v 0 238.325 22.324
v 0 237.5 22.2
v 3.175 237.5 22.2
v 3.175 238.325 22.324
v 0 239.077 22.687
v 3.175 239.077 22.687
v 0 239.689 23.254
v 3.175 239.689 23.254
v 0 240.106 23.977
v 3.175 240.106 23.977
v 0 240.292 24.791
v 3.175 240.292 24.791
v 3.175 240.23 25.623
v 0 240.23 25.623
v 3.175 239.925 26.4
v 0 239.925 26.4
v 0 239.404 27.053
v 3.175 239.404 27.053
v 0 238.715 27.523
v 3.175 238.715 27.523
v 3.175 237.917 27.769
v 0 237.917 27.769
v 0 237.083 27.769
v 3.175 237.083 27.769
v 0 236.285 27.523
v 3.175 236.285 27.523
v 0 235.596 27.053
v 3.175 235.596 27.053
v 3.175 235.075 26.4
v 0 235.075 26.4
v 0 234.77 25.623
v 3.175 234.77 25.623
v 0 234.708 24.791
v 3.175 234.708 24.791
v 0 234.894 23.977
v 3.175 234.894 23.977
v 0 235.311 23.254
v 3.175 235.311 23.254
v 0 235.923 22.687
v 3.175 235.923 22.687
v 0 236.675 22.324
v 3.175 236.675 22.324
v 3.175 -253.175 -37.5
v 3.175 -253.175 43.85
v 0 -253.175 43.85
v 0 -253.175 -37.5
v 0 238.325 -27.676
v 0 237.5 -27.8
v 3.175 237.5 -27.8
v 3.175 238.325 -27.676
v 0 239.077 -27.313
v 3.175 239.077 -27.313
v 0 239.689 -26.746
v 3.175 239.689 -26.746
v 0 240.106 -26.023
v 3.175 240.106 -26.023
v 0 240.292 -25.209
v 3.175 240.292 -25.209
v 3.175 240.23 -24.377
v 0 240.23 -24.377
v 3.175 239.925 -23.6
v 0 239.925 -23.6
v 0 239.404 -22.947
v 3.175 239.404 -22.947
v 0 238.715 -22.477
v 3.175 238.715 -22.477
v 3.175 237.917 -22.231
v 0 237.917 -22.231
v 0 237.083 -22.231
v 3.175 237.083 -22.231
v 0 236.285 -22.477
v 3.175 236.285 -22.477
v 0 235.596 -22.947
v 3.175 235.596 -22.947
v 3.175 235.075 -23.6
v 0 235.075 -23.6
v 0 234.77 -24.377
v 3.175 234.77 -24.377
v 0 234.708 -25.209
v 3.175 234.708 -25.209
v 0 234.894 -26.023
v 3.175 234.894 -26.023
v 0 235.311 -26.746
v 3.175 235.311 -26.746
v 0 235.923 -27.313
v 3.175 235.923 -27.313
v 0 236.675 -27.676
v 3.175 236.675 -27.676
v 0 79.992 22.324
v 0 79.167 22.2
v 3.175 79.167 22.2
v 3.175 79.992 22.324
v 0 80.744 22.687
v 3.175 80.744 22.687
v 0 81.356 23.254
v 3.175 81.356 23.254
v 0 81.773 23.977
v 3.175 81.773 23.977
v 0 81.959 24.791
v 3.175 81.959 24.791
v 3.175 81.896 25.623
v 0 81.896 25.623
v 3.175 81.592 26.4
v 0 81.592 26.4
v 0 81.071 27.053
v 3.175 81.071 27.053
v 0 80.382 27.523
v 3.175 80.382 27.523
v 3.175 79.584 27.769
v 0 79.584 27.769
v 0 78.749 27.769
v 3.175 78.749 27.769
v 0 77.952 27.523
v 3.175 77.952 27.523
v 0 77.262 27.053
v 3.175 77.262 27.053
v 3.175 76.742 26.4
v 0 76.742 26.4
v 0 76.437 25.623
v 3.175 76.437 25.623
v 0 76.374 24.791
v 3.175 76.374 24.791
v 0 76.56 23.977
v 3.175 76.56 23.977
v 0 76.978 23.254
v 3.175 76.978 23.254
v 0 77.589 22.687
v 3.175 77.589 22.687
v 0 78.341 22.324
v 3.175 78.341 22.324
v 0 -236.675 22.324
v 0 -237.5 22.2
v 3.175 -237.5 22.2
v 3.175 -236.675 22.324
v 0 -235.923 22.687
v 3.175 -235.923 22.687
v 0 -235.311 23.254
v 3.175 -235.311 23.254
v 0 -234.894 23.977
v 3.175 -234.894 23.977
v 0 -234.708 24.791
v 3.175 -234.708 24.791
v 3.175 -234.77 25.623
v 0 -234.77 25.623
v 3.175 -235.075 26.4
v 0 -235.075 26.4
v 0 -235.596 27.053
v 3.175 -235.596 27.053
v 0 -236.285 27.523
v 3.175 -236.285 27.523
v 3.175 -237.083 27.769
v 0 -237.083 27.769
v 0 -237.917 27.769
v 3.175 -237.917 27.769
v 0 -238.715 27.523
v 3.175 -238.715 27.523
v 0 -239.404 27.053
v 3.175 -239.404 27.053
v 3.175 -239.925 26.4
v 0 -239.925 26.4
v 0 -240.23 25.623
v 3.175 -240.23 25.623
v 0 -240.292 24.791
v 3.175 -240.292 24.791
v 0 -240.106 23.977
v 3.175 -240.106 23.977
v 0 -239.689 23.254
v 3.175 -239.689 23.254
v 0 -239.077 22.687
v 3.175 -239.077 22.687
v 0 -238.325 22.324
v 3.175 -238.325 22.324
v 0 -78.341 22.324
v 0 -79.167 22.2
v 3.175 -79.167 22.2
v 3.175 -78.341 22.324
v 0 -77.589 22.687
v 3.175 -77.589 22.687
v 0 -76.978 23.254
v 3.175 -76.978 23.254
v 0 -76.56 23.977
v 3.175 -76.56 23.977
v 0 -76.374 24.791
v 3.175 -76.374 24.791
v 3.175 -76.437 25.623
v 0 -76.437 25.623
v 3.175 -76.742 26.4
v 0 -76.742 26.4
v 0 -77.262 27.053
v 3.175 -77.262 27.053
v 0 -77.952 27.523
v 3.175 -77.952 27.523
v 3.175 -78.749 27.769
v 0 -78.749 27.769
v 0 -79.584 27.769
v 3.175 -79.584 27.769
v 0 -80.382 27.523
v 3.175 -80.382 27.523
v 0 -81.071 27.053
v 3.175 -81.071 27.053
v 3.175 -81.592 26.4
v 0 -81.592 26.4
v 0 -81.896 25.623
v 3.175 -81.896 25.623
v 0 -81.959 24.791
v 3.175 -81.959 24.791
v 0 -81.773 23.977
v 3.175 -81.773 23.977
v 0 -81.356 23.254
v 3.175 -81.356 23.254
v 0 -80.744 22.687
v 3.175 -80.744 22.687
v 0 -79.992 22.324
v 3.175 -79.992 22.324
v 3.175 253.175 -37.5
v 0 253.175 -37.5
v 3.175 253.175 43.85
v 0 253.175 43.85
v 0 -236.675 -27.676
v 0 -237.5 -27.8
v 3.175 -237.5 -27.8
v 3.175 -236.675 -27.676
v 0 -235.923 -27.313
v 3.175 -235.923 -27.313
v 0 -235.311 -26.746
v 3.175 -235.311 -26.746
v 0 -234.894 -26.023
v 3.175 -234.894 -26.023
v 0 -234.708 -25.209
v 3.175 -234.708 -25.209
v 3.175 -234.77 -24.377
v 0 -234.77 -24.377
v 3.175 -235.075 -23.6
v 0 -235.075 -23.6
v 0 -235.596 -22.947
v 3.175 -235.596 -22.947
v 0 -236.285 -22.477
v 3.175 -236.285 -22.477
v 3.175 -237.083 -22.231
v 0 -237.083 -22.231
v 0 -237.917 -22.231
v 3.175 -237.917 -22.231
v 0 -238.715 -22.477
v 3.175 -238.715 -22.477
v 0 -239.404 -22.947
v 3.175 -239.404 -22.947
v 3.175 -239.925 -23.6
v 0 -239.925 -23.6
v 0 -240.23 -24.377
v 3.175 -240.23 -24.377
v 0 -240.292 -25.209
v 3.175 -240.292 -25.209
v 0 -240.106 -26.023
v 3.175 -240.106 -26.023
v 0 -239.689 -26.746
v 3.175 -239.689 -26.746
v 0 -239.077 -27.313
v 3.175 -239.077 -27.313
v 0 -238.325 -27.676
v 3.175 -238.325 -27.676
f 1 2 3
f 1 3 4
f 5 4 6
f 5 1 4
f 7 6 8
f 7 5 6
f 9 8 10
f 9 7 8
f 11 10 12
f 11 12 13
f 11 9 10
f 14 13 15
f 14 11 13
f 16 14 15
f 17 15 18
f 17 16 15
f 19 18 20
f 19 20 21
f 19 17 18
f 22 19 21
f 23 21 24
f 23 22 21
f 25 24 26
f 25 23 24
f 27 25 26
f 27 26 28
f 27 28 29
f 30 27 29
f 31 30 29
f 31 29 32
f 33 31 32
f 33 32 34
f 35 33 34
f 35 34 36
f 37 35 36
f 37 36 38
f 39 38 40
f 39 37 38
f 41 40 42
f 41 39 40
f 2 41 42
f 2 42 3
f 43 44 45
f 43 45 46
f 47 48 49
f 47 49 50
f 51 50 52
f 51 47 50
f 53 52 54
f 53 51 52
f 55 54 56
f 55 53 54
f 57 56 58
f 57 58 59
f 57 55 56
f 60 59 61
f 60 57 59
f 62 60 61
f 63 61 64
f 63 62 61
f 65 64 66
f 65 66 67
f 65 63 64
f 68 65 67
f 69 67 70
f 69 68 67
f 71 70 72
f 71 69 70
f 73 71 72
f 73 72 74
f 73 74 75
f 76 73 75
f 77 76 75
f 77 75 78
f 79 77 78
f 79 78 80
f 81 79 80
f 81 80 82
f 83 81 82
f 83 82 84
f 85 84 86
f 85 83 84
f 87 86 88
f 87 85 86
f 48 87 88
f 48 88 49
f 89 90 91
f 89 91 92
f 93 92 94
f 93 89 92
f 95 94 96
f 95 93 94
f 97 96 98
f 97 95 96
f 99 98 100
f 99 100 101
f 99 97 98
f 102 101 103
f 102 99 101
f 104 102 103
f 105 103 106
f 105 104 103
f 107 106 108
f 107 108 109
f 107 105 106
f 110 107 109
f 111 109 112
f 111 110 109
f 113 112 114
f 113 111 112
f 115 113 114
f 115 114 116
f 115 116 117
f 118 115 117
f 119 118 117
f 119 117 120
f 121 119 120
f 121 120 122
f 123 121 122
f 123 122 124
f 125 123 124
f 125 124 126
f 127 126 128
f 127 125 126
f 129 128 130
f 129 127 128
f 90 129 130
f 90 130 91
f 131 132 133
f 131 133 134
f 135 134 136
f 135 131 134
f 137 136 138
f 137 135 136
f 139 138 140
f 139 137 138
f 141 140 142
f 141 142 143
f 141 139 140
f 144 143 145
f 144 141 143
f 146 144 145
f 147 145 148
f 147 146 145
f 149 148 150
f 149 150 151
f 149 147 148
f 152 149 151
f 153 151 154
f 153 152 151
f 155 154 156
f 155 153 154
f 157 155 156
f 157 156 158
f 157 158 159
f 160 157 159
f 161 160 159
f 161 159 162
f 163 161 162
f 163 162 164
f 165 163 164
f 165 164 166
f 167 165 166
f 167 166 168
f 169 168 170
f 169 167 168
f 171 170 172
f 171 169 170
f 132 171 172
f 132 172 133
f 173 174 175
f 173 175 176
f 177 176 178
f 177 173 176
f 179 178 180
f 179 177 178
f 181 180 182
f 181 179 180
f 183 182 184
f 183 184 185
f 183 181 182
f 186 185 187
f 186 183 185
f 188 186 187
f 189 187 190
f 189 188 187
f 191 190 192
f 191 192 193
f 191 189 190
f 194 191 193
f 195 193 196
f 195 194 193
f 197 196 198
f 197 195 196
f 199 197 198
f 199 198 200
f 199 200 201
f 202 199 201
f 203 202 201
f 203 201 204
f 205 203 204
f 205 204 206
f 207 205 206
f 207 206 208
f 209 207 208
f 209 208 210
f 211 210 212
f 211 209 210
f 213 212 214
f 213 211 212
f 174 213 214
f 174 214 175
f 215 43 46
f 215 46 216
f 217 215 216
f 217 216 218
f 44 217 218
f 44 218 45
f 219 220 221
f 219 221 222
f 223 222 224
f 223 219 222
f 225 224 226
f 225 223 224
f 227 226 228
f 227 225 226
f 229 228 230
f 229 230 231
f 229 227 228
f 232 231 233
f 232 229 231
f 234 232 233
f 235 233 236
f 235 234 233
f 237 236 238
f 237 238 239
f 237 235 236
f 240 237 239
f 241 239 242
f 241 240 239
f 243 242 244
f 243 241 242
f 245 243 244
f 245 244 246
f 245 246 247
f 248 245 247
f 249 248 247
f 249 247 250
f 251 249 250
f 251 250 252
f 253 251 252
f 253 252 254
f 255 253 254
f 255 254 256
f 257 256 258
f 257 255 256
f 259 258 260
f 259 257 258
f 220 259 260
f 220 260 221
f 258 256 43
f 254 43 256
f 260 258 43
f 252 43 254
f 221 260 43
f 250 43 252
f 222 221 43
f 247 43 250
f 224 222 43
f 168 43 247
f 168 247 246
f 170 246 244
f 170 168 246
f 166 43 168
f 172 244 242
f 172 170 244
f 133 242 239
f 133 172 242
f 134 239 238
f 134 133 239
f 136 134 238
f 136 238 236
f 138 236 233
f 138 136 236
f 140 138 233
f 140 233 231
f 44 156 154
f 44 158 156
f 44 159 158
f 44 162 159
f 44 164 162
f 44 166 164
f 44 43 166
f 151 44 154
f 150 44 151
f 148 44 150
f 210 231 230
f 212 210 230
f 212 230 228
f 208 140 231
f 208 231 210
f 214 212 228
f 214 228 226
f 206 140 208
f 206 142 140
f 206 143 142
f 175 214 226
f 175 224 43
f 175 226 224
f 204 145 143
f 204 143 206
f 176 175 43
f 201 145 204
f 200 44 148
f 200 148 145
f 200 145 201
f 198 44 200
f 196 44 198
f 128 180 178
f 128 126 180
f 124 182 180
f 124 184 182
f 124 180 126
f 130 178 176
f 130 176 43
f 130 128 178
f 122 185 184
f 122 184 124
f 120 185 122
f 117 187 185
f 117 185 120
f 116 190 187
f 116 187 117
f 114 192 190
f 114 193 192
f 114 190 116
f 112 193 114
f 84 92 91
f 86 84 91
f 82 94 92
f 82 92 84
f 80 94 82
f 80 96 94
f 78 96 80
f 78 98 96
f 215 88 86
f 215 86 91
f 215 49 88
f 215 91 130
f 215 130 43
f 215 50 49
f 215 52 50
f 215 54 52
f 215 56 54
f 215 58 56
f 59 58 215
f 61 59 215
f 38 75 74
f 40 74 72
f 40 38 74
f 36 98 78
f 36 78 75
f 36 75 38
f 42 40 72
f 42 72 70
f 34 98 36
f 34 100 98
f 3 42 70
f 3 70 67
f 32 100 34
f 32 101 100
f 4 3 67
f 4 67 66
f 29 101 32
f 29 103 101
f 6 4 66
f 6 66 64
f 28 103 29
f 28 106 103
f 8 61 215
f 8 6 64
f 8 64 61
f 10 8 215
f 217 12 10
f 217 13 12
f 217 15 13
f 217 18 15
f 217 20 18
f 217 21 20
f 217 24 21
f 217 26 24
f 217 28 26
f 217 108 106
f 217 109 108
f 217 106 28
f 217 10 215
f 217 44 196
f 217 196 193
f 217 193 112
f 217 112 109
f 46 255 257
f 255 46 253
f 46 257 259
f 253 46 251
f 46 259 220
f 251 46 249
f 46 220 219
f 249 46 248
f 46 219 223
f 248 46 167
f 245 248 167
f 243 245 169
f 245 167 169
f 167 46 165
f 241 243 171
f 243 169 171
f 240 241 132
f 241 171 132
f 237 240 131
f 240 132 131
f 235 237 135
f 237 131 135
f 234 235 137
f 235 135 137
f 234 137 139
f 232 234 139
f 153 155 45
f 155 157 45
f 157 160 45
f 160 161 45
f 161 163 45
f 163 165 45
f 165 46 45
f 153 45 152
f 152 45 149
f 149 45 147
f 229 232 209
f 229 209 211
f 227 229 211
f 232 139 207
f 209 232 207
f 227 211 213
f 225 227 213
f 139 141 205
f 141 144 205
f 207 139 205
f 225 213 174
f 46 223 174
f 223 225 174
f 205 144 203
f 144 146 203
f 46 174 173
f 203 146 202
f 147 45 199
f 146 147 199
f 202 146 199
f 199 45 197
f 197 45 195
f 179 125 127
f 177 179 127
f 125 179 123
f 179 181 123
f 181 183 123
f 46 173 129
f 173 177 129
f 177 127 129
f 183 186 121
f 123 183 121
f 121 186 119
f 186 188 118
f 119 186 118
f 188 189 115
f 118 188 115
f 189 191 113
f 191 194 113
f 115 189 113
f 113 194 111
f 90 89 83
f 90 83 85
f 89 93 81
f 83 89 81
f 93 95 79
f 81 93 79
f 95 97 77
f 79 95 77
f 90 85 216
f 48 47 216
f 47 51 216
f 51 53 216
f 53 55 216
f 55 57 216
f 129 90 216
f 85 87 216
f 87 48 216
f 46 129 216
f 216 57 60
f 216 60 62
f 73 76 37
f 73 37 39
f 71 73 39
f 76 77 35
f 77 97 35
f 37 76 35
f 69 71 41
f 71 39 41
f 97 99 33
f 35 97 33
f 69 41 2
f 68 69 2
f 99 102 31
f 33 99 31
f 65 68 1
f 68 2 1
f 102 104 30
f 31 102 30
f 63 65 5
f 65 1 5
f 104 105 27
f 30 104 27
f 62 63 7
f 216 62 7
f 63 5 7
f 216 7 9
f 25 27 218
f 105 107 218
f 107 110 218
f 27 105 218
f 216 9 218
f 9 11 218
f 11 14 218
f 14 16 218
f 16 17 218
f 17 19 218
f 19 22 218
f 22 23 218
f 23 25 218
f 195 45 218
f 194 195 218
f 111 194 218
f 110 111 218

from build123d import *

# Parameters (mm, degrees)
SKETCH1_W           = 500
SKETCH1_H           = 75
SKETCH1_R           = 2.8
BOSS_EXTRUDE1_DEPTH = 3.175
SKETCH2_W           = 500
SKETCH2_H           = 6.35
BOSS_EXTRUDE2_DEPTH = 3.175


with BuildPart() as part:
    # Sketch1 → Boss-Extrude1 (new body)
    # profile 1 of 3: a face of its own
    with BuildSketch(Plane.YZ):
        Rectangle(SKETCH1_W, SKETCH1_H)
        with Locations(Location((-237.5, -25, 0), (0, 0, 270))):
            Circle(SKETCH1_R, mode=Mode.SUBTRACT)
        with Locations(Location((237.49999999, -25, 0), (0, 0, 270))):
            Circle(SKETCH1_R, mode=Mode.SUBTRACT)
        with Locations((79.16666666, -25)):
            Circle(SKETCH1_R, mode=Mode.SUBTRACT)
        with Locations((-79.16666667, -25)):
            Circle(SKETCH1_R, mode=Mode.SUBTRACT)
        with Locations(Location((237.49999999, 25, 0), (0, 0, 270))):
            Circle(SKETCH1_R, mode=Mode.SUBTRACT)
        with Locations(Location((79.16666666, 25, 0), (0, 0, 270))):
            Circle(SKETCH1_R, mode=Mode.SUBTRACT)
        with Locations(Location((-79.16666667, 25, 0), (0, 0, 270))):
            Circle(SKETCH1_R, mode=Mode.SUBTRACT)
        with Locations(Location((-237.5, 25, 0), (0, 0, 270))):
            Circle(SKETCH1_R, mode=Mode.SUBTRACT)
    # profile 2 of 3: a face of its own
    with BuildSketch(Plane.YZ):
        with Locations((-79.16666667, -25)):
            Circle(SKETCH1_R)
    # profile 3 of 3: a face of its own
    with BuildSketch(Plane.YZ):
        with Locations((79.16666666, -25)):
            Circle(SKETCH1_R)
    extrude(amount=BOSS_EXTRUDE1_DEPTH)

    # Sketch2 → Boss-Extrude2 (add, through all)
    with BuildSketch(Plane.YZ.offset(3.175)):
        Polygon((-253.175, -37.5), (-250, -37.5), (-250, 37.5), (-250, 43.85), (-253.175, 43.85), align=None)
        with Locations((0, 40.675)):
            Rectangle(SKETCH2_W, SKETCH2_H)
        Polygon((250, 43.85), (250, 37.5), (250, -37.5), (253.175, -37.5), (253.175, 43.85), align=None)
    extrude(amount=-BOSS_EXTRUDE2_DEPTH)


solid = part.part
